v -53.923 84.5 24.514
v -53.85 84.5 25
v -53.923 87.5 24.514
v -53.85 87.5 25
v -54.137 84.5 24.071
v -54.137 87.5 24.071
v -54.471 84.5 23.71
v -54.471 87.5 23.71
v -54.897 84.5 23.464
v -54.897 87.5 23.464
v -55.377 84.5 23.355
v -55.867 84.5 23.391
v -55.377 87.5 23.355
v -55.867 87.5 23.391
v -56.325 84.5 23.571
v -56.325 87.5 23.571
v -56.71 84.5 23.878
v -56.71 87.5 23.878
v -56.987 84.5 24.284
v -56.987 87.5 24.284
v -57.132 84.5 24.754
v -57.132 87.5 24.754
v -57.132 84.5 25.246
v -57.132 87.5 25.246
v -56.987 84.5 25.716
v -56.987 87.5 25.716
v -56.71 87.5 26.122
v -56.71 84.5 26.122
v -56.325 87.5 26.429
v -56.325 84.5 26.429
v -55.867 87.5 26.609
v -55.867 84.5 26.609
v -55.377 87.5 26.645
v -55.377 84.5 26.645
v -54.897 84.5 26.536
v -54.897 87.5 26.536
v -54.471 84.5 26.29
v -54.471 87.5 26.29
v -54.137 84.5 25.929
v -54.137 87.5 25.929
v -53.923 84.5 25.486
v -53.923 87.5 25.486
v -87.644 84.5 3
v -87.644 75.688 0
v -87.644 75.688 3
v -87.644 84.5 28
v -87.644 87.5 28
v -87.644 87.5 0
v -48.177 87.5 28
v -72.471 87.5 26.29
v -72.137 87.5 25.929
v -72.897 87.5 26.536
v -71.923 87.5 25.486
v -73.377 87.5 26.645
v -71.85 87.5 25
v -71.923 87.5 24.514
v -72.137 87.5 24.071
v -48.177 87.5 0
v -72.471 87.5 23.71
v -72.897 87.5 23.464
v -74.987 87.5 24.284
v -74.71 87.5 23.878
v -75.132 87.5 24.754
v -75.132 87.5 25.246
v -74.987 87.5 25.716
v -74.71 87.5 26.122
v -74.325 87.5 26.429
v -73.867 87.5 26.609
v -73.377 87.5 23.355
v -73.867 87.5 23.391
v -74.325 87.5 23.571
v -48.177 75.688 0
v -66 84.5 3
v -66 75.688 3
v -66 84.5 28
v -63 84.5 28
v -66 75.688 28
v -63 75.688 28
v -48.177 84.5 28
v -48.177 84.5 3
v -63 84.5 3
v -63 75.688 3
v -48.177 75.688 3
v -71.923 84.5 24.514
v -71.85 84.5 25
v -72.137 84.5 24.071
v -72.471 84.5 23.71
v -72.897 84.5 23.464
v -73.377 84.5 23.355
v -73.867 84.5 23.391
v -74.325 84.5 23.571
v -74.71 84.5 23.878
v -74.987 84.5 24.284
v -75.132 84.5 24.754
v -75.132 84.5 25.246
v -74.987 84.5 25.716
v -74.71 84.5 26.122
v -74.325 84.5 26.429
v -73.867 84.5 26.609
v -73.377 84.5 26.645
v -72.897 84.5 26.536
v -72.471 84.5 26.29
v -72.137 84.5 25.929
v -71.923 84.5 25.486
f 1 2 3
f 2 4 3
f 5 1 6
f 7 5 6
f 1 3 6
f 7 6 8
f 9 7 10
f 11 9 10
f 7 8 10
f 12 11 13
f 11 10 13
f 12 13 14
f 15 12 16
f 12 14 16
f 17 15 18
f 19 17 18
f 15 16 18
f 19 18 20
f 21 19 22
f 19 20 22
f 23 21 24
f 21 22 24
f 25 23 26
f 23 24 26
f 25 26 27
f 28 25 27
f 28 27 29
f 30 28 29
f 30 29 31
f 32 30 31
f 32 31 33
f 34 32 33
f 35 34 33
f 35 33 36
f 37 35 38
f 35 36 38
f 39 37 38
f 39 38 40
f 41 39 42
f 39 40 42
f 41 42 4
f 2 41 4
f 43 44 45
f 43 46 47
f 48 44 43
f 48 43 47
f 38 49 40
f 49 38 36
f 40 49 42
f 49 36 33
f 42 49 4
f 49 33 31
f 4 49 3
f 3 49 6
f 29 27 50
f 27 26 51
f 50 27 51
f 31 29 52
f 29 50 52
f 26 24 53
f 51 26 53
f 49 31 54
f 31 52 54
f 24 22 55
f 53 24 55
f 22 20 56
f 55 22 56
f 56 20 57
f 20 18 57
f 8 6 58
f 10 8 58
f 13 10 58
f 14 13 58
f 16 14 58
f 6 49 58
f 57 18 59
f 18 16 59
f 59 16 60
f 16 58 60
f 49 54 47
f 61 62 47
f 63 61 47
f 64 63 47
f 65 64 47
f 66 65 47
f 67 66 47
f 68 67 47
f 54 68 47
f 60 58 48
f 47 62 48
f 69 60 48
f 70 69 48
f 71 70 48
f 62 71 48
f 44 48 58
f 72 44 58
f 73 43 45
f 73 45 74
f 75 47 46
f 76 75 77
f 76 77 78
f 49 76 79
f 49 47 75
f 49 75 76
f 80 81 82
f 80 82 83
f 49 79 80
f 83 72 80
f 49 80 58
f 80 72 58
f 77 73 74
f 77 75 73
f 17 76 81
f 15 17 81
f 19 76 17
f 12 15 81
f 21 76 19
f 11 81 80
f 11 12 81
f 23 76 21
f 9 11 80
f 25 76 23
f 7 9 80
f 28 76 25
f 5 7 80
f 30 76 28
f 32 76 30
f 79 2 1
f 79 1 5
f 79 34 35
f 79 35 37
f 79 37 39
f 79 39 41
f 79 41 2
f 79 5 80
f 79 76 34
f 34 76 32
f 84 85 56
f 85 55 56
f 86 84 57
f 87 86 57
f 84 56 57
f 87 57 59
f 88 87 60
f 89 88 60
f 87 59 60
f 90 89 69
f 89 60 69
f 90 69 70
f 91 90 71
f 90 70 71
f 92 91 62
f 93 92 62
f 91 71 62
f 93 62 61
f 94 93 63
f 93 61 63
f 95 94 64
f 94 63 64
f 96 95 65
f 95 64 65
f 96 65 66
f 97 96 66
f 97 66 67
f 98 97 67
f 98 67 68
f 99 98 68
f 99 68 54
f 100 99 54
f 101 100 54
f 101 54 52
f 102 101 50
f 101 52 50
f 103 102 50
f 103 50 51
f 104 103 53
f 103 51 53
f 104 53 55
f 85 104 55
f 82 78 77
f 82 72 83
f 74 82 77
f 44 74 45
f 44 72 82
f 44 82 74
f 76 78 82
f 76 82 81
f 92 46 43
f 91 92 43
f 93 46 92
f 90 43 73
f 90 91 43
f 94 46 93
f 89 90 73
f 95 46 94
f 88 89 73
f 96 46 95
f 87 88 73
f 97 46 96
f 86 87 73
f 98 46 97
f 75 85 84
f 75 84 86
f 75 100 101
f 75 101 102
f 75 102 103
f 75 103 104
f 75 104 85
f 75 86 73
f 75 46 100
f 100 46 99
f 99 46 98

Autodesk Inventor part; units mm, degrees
ref_plane "YZ Plane" through (0, 0, 0) normal (1, 0, 0) x (0, 1, 0)
ref_plane "XZ Plane" through (0, 0, 0) normal (0, 1, 0) x (-1, 0, 0)
ref_plane "XY Plane" through (0, 0, 0) normal (0, 0, 1) x (1, 0, 0)
sketch "Sketch1" plane through (0, 0, 0) normal (0, 0, 1) x (1, 0, 0)
  line L0 (-109, -87.5) -> (109, -87.5)
  line L1 (109, -87.5) -> (109, 87.5)
  line L2 (109, 87.5) -> (-109, 87.5)
  line L3 (-109, 87.5) -> (-109, -87.5)
  line L4 (-109, -87.5) -> (109, 87.5) construction
  line L5 (109, -87.5) -> (-109, 87.5) construction
  point P0 (0, 0)
  dimension "d0" = 218
  dimension "d1" = 175
extrude "Extrusion1" add sketch "Sketch1" along normal blind 28
sketch "Sketch2" plane through (0, 0, 28) normal (0, 0, 1) x (1, 0, 0)
  line L0 (-106, 84.5) -> (-66, 84.5)
  line L1 (-66, 84.5) -> (-66, 44.5)
  line L2 (-66, 44.5) -> (-106, 44.5)
  line L3 (-106, 44.5) -> (-106, 84.5)
  line L4 (-106, 84.5) -> (-66, 44.5) construction
  line L5 (-66, 84.5) -> (-106, 44.5) construction
  line L6 (109, 87.5) -> (-109, 87.5) projected
  line L7 (-109, 87.5) -> (-109, -87.5) projected
  line L8 (-63, 84.5) -> (-23, 84.5)
  line L9 (-23, 84.5) -> (-23, 44.5)
  line L10 (-23, 44.5) -> (-63, 44.5)
  line L11 (-63, 44.5) -> (-63, 84.5)
  line L12 (-63, 84.5) -> (-23, 44.5) construction
  line L13 (-23, 84.5) -> (-63, 44.5) construction
  line L14 (-20, 84.5) -> (20, 84.5)
  line L15 (20, 84.5) -> (20, 44.5)
  line L16 (20, 44.5) -> (-20, 44.5)
  line L17 (-20, 44.5) -> (-20, 84.5)
  line L18 (-20, 84.5) -> (20, 44.5) construction
  line L19 (20, 84.5) -> (-20, 44.5) construction
  line L20 (23, 84.5) -> (63, 84.5)
  line L21 (63, 84.5) -> (63, 44.5)
  line L22 (63, 44.5) -> (23, 44.5)
  line L23 (23, 44.5) -> (23, 84.5)
  line L24 (23, 84.5) -> (63, 44.5) construction
  line L25 (63, 84.5) -> (23, 44.5) construction
  line L26 (66, 84.5) -> (106, 84.5)
  line L27 (106, 84.5) -> (106, 44.5)
  line L28 (106, 44.5) -> (66, 44.5)
  line L29 (66, 44.5) -> (66, 84.5)
  line L30 (66, 84.5) -> (106, 44.5) construction
  line L31 (106, 84.5) -> (66, 44.5) construction
  line L32 (-106, 41.5) -> (-66, 41.5)
  line L33 (-66, 41.5) -> (-66, 1.5)
  line L34 (-66, 1.5) -> (-106, 1.5)
  line L35 (-106, 1.5) -> (-106, 41.5)
  line L36 (-106, 41.5) -> (-66, 1.5) construction
  line L37 (-66, 41.5) -> (-106, 1.5) construction
  line L38 (-63, 41.5) -> (-23, 41.5)
  line L39 (-23, 41.5) -> (-23, 1.5)
  line L40 (-23, 1.5) -> (-63, 1.5)
  line L41 (-63, 1.5) -> (-63, 41.5)
  line L42 (-63, 41.5) -> (-23, 1.5) construction
  line L43 (-23, 41.5) -> (-63, 1.5) construction
  line L44 (-20, 41.5) -> (20, 41.5)
  line L45 (20, 41.5) -> (20, 1.5)
  line L46 (20, 1.5) -> (-20, 1.5)
  line L47 (-20, 1.5) -> (-20, 41.5)
  line L48 (-20, 41.5) -> (20, 1.5) construction
  line L49 (20, 41.5) -> (-20, 1.5) construction
  line L50 (23, 41.5) -> (63, 41.5)
  line L51 (63, 41.5) -> (63, 1.5)
  line L52 (63, 1.5) -> (23, 1.5)
  line L53 (23, 1.5) -> (23, 41.5)
  line L54 (23, 41.5) -> (63, 1.5) construction
  line L55 (63, 41.5) -> (23, 1.5) construction
  line L56 (66, 41.5) -> (106, 41.5)
  line L57 (106, 41.5) -> (106, 1.5)
  line L58 (106, 1.5) -> (66, 1.5)
  line L59 (66, 1.5) -> (66, 41.5)
  line L60 (66, 41.5) -> (106, 1.5) construction
  line L61 (106, 41.5) -> (66, 1.5) construction
  line L62 (-106, -1.5) -> (-66, -1.5)
  line L63 (-66, -1.5) -> (-66, -41.5)
  line L64 (-66, -41.5) -> (-106, -41.5)
  line L65 (-106, -41.5) -> (-106, -1.5)
  line L66 (-106, -1.5) -> (-66, -41.5) construction
  line L67 (-66, -1.5) -> (-106, -41.5) construction
  line L68 (-63, -1.5) -> (-23, -1.5)
  line L69 (-23, -1.5) -> (-23, -41.5)
  line L70 (-23, -41.5) -> (-63, -41.5)
  line L71 (-63, -41.5) -> (-63, -1.5)
  line L72 (-63, -1.5) -> (-23, -41.5) construction
  line L73 (-23, -1.5) -> (-63, -41.5) construction
  line L74 (-20, -1.5) -> (20, -1.5)
  line L75 (20, -1.5) -> (20, -41.5)
  line L76 (20, -41.5) -> (-20, -41.5)
  line L77 (-20, -41.5) -> (-20, -1.5)
  line L78 (-20, -1.5) -> (20, -41.5) construction
  line L79 (20, -1.5) -> (-20, -41.5) construction
  line L80 (23, -1.5) -> (63, -1.5)
  line L81 (63, -1.5) -> (63, -41.5)
  line L82 (63, -41.5) -> (23, -41.5)
  line L83 (23, -41.5) -> (23, -1.5)
  line L84 (23, -1.5) -> (63, -41.5) construction
  line L85 (63, -1.5) -> (23, -41.5) construction
  line L86 (66, -1.5) -> (106, -1.5)
  line L87 (106, -1.5) -> (106, -41.5)
  line L88 (106, -41.5) -> (66, -41.5)
  line L89 (66, -41.5) -> (66, -1.5)
  line L90 (66, -1.5) -> (106, -41.5) construction
  line L91 (106, -1.5) -> (66, -41.5) construction
  line L92 (-106, -44.5) -> (-66, -44.5)
  line L93 (-66, -44.5) -> (-66, -84.5)
  line L94 (-66, -84.5) -> (-106, -84.5)
  line L95 (-106, -84.5) -> (-106, -44.5)
  line L96 (-106, -44.5) -> (-66, -84.5) construction
  line L97 (-66, -44.5) -> (-106, -84.5) construction
  line L98 (-63, -44.5) -> (-23, -44.5)
  line L99 (-23, -44.5) -> (-23, -84.5)
  line L100 (-23, -84.5) -> (-63, -84.5)
  line L101 (-63, -84.5) -> (-63, -44.5)
  line L102 (-63, -44.5) -> (-23, -84.5) construction
  line L103 (-23, -44.5) -> (-63, -84.5) construction
  line L104 (-20, -44.5) -> (20, -44.5)
  line L105 (20, -44.5) -> (20, -84.5)
  line L106 (20, -84.5) -> (-20, -84.5)
  line L107 (-20, -84.5) -> (-20, -44.5)
  line L108 (-20, -44.5) -> (20, -84.5) construction
  line L109 (20, -44.5) -> (-20, -84.5) construction
  line L110 (23, -44.5) -> (63, -44.5)
  line L111 (63, -44.5) -> (63, -84.5)
  line L112 (63, -84.5) -> (23, -84.5)
  line L113 (23, -84.5) -> (23, -44.5)
  line L114 (23, -44.5) -> (63, -84.5) construction
  line L115 (63, -44.5) -> (23, -84.5) construction
  line L116 (66, -44.5) -> (106, -44.5)
  line L117 (106, -44.5) -> (106, -84.5)
  line L118 (106, -84.5) -> (66, -84.5)
  line L119 (66, -84.5) -> (66, -44.5)
  line L120 (66, -44.5) -> (106, -84.5) construction
  line L121 (106, -44.5) -> (66, -84.5) construction
  point P0 (0, 0)
  point P1 (-86, 64.5)
  point P2 (-43, 64.5)
  point P3 (0, 64.5)
  point P4 (43, 64.5)
  point P5 (86, 64.5)
  point P6 (-86, 21.5)
  point P7 (-43, 21.5)
  point P8 (0, 21.5)
  point P9 (43, 21.5)
  point P10 (86, 21.5)
  point P11 (-86, -21.5)
  point P12 (-43, -21.5)
  point P13 (0, -21.5)
  point P14 (43, -21.5)
  point P15 (86, -21.5)
  point P16 (-86, -64.5)
  point P17 (-43, -64.5)
  point P18 (0, -64.5)
  point P19 (43, -64.5)
  point P20 (86, -64.5)
  dimension "d4" = 40
  dimension "d5" = 3
  dimension "d6" = 3
  dimension "d7" = 40
  dimension "d10" = 43
  dimension "d13" = 43
extrude "Extrusion2" cut sketch "Sketch2" against normal blind 25
sketch "Sketch3" plane through (-109, 87.5, 0) normal (0, 1, 0) x (1, 0, 0)
  line L0 (46, -28) -> (46, -3) construction
  line L1 (43, -28) -> (43, -3) construction
  line L2 (43, -28) -> (43, -3) projected
  line L3 (43, -25) -> (46, -25) construction
  line L4 (46, -28) -> (46, -3) projected
  line L5 (218, -28) -> (0, -28) projected
  circle A0 centre (53.5, -25) radius 1.65
  circle A1 centre (35.5, -25) radius 1.65
  line L6 (172, -28) -> (172, -3) construction
  line L7 (175, -28) -> (175, -3) construction
  line L8 (172, -28) -> (172, -3) projected
  line L9 (172, -25) -> (175, -25) construction
  circle A2 centre (182.5, -25) radius 1.65
  circle A3 centre (164.5, -25) radius 1.65
  point P0 (109, 0)
  point P1 (44.5, -25)
  point P2 (173.5, -25)
  dimension "d20" = 3
  dimension "d21" = 3.3
  dimension "d22" = 9
  dimension "d23" = 3.3
  dimension "d24" = 9
  dimension "d25" = 3.3
  dimension "d27" = 9
  dimension "d30" = 3
  dimension "d31" = 3.3
  dimension "d32" = 9
extrude "Extrusion3" cut sketch "Sketch3" against normal blind 10
sketch "Sketch4" plane through (0, 0, 0) normal (0, 0, -1) x (-1, 0, 0)
  line L0 (-109, 87.5) -> (109, 87.5) projected
  line L1 (48.1771, 87.5) -> (-137.115, 87.5)
  line L2 (-137.115, 87.5) -> (-137.115, -97.6556)
  line L3 (-137.115, -97.6556) -> (48.1771, -97.6556)
  line L4 (48.1771, -97.6556) -> (48.1771, 87.5)
  line L5 (153.7374, -115.3645) -> (-15.4329, -115.3645)
  line L6 (-15.4329, -115.3645) -> (-15.4329, 75.6885)
  line L7 (-15.4329, 75.6885) -> (153.7374, 75.6885)
  line L8 (153.7374, 75.6885) -> (153.7374, -115.3645)
  line L9 (153.7374, 38.7258) -> (87.6444, 38.7258)
  line L10 (87.6444, 38.7258) -> (87.6444, 105.9246)
  line L11 (87.6444, 105.9246) -> (153.7374, 105.9246)
  line L12 (153.7374, 105.9246) -> (153.7374, 38.7258)
  point P0 (0, 0)
  point P1 (87.6444, 75.6885)
  point P2 (48.1771, 75.6885)
  point P3 (-15.4329, -97.6556)
  point P4 (153.7374, 75.6885)
extrude "Extrusion4" cut sketch "Sketch4" against normal through all contours L0 L4 L7 L6 L3 L2 L1 | L10 L11 L12 L7 | L7 L10 L9 L8 L5 L6 L3 L4 | L4 L3 L6 L7 | L7 L8 L9 L10
equation "\"d0\" = box_length"
equation "\"d1\" = box_width"
equation "\"d2\" = hole_height + wall"
equation "\"d4\" = hole"
equation "\"d5\" = wall"
equation "\"d6\" = wall"
equation "\"d7\" = hole"
equation "\"d10\" = hole + wall"
equation "\"d13\" = hole + wall"
equation "\"d16\" = hole_height"
equation "\"d23\" = d21"
equation "\"d24\" = d22"
equation "\"d25\" = d21"
equation "\"d27\" = d22"
equation "\"d31\" = d25"
equation "\"d32\" = d27"
equation "\"hole\" = 40"
equation "\"wall\" = 3"
equation "\"hole_height\" = 25"
equation "\"box_length\" = 218"
equation "\"box_width\" = 175"
properties part number "RatPelletBox_v02_holetest"
